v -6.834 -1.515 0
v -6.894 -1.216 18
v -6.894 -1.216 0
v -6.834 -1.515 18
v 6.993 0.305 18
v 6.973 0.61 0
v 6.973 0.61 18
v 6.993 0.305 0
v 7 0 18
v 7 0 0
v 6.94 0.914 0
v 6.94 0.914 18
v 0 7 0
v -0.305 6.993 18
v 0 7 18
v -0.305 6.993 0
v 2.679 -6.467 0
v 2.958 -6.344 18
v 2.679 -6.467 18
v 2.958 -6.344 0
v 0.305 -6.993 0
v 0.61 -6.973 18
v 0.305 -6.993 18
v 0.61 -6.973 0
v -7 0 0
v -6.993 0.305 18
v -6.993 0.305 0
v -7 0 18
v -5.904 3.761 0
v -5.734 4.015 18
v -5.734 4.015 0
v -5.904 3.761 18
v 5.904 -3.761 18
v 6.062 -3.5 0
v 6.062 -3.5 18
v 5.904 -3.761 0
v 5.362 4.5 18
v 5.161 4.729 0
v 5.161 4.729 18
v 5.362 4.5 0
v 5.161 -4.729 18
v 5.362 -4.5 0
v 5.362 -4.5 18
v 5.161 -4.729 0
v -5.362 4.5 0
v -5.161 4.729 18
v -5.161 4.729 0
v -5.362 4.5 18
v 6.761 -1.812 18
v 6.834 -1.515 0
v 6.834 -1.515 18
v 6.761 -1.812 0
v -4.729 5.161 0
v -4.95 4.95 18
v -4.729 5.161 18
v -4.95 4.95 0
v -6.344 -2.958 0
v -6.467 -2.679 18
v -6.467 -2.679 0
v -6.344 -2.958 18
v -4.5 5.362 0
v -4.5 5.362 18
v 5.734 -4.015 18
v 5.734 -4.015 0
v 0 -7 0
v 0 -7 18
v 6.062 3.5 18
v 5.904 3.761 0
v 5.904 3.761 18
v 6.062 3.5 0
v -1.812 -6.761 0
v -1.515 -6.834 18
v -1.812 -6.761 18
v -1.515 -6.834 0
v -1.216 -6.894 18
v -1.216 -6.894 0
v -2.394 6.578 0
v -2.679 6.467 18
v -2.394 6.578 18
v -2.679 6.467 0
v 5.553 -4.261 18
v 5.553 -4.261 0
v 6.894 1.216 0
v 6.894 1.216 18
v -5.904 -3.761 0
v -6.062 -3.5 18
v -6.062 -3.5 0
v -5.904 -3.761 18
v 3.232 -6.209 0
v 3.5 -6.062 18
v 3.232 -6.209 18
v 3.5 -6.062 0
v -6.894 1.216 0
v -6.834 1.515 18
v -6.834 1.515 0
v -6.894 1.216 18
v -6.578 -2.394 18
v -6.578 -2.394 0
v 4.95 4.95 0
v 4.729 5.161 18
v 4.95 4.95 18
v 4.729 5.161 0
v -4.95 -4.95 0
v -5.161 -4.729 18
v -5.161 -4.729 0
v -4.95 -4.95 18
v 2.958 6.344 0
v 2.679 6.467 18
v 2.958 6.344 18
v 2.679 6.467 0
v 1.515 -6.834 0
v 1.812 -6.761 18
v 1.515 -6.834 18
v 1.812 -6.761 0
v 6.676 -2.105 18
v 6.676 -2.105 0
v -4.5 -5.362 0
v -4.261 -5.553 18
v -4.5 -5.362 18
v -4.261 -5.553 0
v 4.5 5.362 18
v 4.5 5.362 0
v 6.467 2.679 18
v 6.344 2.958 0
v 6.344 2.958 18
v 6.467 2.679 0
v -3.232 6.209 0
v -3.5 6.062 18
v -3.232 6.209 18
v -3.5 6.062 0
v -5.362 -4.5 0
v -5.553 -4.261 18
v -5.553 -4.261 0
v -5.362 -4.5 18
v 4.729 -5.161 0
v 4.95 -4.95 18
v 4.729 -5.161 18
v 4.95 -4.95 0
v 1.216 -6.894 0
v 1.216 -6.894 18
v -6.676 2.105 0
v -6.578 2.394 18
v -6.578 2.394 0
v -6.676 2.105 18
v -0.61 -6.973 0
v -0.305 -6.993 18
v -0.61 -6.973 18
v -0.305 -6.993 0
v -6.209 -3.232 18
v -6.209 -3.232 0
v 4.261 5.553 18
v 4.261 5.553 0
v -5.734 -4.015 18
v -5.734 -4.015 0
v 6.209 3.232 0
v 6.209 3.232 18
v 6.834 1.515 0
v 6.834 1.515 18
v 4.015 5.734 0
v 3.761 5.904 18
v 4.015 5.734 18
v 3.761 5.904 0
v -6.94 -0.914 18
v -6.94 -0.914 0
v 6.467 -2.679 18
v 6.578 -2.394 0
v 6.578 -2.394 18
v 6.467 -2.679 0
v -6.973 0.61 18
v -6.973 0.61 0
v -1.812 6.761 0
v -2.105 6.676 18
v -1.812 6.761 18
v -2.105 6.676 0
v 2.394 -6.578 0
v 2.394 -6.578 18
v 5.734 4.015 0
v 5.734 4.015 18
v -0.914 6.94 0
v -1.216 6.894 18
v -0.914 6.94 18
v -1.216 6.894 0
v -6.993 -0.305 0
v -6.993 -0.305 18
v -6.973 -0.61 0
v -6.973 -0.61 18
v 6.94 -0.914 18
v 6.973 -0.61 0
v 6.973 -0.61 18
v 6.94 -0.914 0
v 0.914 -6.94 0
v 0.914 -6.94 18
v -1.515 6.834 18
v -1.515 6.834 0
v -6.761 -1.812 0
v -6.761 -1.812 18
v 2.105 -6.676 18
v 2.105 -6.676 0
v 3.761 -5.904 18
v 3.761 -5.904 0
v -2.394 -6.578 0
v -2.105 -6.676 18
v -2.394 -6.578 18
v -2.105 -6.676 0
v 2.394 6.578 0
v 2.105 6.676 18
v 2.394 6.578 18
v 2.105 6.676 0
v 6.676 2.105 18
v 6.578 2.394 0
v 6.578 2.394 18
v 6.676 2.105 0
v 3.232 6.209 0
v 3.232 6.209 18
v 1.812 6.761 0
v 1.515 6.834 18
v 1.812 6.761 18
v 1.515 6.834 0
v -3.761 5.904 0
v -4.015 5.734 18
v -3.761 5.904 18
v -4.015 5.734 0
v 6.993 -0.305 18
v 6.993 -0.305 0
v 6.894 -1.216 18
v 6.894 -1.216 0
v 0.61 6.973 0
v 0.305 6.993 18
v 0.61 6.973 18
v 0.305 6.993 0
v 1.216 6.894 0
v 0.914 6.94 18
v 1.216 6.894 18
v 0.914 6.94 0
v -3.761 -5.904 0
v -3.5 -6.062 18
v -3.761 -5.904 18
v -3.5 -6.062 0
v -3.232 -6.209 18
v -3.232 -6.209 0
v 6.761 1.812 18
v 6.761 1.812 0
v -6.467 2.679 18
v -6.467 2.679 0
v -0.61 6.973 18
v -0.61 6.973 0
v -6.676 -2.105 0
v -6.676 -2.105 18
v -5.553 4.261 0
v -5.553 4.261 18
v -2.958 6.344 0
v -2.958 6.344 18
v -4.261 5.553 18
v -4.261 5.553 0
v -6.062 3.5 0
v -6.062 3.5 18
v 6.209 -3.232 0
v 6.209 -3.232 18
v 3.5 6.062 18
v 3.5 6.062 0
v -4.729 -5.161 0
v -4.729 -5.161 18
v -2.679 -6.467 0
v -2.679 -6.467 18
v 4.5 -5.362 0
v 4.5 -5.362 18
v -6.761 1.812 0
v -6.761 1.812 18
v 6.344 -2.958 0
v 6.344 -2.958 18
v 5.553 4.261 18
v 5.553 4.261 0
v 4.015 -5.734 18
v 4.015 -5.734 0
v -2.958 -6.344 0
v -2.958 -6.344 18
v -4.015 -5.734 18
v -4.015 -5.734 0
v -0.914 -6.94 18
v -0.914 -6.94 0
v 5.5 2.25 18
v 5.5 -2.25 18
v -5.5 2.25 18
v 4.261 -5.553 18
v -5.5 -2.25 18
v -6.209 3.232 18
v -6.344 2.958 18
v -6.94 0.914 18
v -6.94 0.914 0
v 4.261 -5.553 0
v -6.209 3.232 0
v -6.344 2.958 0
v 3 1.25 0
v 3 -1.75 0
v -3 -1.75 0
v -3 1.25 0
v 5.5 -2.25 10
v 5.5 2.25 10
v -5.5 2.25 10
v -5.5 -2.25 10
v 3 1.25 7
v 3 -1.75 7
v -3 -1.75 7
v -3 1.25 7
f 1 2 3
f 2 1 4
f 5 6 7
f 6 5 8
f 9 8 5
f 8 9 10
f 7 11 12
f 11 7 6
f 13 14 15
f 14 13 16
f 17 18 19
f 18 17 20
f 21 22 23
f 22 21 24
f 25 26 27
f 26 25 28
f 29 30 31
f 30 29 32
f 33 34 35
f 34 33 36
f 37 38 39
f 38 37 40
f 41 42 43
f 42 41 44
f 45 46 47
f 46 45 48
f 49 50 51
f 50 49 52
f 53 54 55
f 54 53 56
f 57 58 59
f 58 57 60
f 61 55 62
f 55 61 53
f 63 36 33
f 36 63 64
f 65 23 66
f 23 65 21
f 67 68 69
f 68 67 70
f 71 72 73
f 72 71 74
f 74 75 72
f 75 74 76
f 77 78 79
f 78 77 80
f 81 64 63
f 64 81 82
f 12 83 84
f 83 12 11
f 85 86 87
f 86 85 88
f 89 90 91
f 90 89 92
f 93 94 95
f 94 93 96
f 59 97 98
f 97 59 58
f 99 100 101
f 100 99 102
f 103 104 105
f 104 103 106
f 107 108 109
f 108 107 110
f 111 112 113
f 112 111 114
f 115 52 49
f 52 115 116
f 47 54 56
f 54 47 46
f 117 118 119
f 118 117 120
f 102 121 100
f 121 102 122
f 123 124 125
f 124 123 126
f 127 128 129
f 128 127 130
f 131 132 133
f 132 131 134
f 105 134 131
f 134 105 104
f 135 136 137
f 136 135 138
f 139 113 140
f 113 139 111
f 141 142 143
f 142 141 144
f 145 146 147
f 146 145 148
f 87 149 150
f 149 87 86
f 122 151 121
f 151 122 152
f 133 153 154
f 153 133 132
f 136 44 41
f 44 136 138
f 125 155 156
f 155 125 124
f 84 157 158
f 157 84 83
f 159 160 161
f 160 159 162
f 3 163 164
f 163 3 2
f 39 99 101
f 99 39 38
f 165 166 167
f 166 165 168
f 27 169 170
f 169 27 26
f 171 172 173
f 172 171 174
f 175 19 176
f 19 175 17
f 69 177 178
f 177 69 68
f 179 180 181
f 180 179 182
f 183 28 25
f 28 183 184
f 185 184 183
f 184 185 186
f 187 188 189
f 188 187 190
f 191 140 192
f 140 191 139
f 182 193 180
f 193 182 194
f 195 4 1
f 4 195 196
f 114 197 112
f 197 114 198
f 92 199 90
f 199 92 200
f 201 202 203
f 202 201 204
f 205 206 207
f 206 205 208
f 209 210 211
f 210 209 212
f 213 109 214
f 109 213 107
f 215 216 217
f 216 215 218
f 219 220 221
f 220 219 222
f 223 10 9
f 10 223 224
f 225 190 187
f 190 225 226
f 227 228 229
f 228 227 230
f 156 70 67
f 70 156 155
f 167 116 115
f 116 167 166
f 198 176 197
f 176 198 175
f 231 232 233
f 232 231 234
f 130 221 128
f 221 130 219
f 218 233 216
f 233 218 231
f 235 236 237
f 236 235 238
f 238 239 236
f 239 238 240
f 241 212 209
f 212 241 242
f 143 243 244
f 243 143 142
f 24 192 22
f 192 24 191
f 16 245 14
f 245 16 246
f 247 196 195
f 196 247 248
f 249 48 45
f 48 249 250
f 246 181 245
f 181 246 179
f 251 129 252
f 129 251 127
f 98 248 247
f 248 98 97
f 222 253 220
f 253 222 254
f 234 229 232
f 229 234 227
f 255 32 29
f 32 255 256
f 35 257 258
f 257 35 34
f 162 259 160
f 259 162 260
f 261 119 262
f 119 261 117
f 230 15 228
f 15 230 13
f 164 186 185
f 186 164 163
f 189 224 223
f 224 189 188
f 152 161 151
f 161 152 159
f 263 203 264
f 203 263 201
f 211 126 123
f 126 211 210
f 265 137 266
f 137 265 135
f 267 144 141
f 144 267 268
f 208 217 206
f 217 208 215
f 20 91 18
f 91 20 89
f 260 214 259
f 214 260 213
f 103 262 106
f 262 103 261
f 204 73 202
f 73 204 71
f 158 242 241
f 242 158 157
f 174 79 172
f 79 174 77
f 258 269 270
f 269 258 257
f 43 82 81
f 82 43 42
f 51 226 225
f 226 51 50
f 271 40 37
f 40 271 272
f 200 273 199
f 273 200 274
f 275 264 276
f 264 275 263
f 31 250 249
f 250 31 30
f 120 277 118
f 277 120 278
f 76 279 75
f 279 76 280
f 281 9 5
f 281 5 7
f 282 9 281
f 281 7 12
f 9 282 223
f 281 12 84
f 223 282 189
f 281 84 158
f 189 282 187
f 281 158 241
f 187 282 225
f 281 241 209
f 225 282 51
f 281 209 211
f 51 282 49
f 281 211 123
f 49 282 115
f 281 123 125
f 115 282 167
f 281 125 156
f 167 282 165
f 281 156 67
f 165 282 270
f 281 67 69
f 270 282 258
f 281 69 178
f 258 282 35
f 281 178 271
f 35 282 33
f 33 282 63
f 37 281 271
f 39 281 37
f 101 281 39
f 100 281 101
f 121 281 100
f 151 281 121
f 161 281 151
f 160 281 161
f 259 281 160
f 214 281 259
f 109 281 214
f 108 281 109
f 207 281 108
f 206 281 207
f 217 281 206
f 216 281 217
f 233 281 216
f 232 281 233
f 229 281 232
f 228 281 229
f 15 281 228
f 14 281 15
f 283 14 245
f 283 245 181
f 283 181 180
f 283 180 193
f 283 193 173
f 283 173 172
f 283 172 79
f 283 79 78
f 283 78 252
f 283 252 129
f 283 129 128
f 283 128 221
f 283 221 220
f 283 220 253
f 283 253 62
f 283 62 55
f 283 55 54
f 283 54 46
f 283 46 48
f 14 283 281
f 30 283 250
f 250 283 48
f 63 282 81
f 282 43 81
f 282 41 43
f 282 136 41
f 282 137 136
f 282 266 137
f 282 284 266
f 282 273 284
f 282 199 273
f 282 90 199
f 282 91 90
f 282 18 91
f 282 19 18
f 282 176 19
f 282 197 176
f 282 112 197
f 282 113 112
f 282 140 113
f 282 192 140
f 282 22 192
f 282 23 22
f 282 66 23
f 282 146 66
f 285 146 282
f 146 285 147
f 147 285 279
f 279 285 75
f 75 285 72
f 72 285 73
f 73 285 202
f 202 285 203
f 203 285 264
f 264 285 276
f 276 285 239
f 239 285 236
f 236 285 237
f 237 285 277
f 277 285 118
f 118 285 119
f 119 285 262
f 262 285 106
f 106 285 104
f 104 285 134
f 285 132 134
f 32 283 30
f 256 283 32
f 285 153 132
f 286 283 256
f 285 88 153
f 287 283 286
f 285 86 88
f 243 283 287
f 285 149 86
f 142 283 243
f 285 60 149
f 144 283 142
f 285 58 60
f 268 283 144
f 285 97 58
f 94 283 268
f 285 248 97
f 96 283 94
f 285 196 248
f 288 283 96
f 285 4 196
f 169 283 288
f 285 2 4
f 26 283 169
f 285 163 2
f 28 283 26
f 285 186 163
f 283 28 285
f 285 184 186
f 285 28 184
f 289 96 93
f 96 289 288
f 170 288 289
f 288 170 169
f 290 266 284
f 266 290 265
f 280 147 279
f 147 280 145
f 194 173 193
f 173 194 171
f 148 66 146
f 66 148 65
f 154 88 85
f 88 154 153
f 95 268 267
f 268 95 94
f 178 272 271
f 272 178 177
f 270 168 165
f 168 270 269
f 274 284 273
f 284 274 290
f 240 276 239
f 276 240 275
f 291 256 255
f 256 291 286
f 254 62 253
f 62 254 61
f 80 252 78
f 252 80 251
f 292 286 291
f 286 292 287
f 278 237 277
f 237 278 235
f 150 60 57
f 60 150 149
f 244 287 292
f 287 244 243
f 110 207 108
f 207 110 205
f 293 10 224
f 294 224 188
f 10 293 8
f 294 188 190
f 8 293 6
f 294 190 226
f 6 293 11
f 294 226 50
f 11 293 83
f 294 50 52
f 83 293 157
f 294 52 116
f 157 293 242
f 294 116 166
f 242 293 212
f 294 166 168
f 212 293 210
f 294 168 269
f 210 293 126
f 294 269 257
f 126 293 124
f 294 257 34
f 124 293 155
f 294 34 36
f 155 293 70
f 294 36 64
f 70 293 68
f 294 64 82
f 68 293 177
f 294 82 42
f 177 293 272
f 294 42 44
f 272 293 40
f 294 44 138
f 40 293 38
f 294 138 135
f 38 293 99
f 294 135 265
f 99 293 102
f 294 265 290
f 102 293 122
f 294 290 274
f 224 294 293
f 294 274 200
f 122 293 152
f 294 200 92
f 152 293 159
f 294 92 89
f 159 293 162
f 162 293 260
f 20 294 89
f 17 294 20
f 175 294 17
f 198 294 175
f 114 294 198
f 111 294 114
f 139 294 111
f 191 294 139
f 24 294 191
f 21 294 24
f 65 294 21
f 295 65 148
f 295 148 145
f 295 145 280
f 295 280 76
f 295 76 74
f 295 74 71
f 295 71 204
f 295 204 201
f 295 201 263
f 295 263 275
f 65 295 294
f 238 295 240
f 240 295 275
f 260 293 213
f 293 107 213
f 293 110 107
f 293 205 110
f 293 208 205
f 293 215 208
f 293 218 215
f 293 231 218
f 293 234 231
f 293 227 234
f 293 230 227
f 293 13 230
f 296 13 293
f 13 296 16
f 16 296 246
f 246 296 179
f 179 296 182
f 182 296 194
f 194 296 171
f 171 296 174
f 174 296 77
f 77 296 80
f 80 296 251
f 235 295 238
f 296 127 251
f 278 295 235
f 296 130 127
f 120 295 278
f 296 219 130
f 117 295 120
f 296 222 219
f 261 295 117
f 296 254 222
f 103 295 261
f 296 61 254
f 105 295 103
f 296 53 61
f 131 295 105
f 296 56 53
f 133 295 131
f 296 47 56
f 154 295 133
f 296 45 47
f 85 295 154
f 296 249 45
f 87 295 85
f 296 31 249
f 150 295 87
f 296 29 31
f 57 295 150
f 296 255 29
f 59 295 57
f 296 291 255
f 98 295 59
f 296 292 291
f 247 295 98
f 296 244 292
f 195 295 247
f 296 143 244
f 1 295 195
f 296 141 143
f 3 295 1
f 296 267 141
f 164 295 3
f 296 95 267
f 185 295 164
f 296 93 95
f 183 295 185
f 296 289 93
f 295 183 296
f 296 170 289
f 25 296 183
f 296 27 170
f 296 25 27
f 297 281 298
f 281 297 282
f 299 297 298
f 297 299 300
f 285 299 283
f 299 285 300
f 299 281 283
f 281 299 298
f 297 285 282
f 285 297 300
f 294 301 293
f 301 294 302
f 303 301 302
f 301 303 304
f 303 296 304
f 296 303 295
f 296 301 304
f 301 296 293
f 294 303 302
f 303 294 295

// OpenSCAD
// Model purpose: Shaft adapter for motorized blinds that couples the motor shaft geometry to the blind shaft geometry in a compact printable interface.
// Based on Motorized MQTT Blinds concepts, with dimensions tuned to your hardware so torque transfer is reliable without slippage.
// this is based on thehookup's Motorized MQTT Blinds project:
// https://github.com/thehookup/Motorized_MQTT_Blinds/

$fn = 144;

difference() {
  cylinder(18, 7, 7);

  // blinds shaft
  translate([-11/2, -4.5/2, 10])
    cube([11, 4.5, 8]);

  // motor shaft
  translate([-6/2, -3.5/2, 0])
    cube([6, 3.0, 7]);
}
